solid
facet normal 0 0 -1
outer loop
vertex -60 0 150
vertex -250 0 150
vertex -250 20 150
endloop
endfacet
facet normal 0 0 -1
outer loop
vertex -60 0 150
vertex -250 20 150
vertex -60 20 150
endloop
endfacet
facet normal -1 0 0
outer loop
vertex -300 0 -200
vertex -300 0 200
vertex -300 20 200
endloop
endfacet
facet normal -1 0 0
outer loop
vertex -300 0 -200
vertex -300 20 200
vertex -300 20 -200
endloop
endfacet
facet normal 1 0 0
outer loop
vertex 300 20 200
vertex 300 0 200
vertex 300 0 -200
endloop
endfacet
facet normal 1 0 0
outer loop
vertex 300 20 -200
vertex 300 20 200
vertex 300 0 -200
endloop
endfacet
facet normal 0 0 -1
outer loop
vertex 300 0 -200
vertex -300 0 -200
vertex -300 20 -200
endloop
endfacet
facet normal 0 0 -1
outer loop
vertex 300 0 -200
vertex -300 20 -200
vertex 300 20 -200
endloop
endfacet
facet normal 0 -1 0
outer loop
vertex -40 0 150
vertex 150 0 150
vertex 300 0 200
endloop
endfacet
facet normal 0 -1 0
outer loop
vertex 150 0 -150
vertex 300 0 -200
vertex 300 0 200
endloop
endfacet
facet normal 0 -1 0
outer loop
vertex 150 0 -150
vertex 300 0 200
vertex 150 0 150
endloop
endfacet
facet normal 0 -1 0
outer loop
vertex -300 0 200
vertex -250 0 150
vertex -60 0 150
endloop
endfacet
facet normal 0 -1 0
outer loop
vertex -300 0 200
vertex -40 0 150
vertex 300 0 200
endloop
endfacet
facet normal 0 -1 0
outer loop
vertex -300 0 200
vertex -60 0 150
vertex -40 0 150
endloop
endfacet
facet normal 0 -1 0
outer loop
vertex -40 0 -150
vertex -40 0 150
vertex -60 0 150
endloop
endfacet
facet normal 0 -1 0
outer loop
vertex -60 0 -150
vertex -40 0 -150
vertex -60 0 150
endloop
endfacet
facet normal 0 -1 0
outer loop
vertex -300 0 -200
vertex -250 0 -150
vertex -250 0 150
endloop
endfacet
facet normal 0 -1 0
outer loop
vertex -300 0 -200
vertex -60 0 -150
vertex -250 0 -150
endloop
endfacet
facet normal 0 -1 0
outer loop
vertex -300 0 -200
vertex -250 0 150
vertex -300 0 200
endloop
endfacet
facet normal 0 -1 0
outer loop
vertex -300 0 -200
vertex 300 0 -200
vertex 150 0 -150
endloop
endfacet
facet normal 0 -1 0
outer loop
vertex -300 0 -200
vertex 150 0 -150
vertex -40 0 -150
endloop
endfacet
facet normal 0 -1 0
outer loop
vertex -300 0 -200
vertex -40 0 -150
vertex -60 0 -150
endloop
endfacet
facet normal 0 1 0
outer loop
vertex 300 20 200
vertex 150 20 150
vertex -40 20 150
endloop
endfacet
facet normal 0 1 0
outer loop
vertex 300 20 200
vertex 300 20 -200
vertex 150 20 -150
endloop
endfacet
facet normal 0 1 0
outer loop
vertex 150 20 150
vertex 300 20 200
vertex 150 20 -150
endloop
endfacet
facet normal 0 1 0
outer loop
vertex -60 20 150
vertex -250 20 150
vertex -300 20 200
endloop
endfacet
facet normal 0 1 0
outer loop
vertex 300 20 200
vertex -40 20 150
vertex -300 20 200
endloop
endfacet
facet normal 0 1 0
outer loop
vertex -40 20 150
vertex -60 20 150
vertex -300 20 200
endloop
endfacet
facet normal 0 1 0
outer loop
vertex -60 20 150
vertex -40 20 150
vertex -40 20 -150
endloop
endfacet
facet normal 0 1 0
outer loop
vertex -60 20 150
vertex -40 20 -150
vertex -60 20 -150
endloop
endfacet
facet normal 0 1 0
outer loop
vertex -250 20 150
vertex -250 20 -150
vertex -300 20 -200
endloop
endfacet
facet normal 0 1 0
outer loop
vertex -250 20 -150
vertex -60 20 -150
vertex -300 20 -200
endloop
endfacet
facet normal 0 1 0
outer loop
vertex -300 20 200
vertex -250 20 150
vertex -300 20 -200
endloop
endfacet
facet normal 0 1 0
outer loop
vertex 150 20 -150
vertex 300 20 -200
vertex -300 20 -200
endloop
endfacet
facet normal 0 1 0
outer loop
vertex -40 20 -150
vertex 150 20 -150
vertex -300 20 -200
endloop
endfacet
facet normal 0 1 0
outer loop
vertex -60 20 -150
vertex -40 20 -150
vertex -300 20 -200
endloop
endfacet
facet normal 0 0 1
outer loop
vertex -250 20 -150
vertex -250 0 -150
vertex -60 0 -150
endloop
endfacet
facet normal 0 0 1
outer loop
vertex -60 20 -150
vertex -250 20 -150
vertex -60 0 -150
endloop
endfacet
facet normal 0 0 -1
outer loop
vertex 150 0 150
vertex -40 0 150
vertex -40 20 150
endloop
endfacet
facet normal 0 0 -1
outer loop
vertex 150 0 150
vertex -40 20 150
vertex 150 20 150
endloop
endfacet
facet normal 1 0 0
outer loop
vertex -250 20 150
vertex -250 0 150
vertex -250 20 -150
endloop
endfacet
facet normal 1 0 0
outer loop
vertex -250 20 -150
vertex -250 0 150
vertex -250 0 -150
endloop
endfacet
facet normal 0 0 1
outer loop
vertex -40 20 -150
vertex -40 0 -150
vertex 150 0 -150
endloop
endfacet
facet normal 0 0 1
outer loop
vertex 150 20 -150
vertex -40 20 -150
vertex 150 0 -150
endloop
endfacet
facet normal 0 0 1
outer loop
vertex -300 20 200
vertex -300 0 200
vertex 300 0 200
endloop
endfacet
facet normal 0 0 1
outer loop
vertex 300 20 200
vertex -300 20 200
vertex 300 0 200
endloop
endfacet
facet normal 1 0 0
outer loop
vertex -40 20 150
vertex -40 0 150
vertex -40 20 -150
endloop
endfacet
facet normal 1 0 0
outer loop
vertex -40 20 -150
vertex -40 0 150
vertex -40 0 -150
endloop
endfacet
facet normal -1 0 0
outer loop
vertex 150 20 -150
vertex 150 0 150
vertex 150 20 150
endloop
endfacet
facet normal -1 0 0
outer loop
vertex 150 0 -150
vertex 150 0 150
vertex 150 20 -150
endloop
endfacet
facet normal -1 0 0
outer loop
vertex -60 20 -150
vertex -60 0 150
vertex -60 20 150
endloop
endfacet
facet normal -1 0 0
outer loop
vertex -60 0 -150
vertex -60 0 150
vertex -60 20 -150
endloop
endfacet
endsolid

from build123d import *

# Parameters (mm, degrees)
SKETCH1_W           = 600
SKETCH1_H           = 400
BOSS_EXTRUDE2_DEPTH = 20
SKETCH1_10_W        = 190
SKETCH1_10_H        = 300
BOSS_EXTRUDE5_DEPTH = 20


with BuildPart() as part:
    # Sketch1 → Boss-Extrude2 (new body)
    with BuildSketch(Plane(origin=(0, 0, 0), x_dir=(1, 0, 0), z_dir=(0, 1, 0))):
        Rectangle(SKETCH1_W, SKETCH1_H)
        Polygon((-270, -170), (-270, 170), (170, 170), (170, 150), (170, -150), (170, -170), align=None, mode=Mode.SUBTRACT)
    extrude(amount=BOSS_EXTRUDE2_DEPTH)

    # Sketch1<10> → Boss-Extrude5 (add)
    with BuildSketch(Plane(origin=(0, 0, 0), x_dir=(1, 0, 0), z_dir=(0, 1, 0))):
        Polygon((170, 170), (-270, 170), (-270, -170), (170, -170), (170, -150), (170, 150), align=None)
        with Locations((-155, 0)):
            Rectangle(SKETCH1_10_W, SKETCH1_10_H, mode=Mode.SUBTRACT)
        with Locations((55, 0)):
            Rectangle(SKETCH1_10_W, SKETCH1_10_H, mode=Mode.SUBTRACT)
    extrude(amount=BOSS_EXTRUDE5_DEPTH)


solid = part.part
